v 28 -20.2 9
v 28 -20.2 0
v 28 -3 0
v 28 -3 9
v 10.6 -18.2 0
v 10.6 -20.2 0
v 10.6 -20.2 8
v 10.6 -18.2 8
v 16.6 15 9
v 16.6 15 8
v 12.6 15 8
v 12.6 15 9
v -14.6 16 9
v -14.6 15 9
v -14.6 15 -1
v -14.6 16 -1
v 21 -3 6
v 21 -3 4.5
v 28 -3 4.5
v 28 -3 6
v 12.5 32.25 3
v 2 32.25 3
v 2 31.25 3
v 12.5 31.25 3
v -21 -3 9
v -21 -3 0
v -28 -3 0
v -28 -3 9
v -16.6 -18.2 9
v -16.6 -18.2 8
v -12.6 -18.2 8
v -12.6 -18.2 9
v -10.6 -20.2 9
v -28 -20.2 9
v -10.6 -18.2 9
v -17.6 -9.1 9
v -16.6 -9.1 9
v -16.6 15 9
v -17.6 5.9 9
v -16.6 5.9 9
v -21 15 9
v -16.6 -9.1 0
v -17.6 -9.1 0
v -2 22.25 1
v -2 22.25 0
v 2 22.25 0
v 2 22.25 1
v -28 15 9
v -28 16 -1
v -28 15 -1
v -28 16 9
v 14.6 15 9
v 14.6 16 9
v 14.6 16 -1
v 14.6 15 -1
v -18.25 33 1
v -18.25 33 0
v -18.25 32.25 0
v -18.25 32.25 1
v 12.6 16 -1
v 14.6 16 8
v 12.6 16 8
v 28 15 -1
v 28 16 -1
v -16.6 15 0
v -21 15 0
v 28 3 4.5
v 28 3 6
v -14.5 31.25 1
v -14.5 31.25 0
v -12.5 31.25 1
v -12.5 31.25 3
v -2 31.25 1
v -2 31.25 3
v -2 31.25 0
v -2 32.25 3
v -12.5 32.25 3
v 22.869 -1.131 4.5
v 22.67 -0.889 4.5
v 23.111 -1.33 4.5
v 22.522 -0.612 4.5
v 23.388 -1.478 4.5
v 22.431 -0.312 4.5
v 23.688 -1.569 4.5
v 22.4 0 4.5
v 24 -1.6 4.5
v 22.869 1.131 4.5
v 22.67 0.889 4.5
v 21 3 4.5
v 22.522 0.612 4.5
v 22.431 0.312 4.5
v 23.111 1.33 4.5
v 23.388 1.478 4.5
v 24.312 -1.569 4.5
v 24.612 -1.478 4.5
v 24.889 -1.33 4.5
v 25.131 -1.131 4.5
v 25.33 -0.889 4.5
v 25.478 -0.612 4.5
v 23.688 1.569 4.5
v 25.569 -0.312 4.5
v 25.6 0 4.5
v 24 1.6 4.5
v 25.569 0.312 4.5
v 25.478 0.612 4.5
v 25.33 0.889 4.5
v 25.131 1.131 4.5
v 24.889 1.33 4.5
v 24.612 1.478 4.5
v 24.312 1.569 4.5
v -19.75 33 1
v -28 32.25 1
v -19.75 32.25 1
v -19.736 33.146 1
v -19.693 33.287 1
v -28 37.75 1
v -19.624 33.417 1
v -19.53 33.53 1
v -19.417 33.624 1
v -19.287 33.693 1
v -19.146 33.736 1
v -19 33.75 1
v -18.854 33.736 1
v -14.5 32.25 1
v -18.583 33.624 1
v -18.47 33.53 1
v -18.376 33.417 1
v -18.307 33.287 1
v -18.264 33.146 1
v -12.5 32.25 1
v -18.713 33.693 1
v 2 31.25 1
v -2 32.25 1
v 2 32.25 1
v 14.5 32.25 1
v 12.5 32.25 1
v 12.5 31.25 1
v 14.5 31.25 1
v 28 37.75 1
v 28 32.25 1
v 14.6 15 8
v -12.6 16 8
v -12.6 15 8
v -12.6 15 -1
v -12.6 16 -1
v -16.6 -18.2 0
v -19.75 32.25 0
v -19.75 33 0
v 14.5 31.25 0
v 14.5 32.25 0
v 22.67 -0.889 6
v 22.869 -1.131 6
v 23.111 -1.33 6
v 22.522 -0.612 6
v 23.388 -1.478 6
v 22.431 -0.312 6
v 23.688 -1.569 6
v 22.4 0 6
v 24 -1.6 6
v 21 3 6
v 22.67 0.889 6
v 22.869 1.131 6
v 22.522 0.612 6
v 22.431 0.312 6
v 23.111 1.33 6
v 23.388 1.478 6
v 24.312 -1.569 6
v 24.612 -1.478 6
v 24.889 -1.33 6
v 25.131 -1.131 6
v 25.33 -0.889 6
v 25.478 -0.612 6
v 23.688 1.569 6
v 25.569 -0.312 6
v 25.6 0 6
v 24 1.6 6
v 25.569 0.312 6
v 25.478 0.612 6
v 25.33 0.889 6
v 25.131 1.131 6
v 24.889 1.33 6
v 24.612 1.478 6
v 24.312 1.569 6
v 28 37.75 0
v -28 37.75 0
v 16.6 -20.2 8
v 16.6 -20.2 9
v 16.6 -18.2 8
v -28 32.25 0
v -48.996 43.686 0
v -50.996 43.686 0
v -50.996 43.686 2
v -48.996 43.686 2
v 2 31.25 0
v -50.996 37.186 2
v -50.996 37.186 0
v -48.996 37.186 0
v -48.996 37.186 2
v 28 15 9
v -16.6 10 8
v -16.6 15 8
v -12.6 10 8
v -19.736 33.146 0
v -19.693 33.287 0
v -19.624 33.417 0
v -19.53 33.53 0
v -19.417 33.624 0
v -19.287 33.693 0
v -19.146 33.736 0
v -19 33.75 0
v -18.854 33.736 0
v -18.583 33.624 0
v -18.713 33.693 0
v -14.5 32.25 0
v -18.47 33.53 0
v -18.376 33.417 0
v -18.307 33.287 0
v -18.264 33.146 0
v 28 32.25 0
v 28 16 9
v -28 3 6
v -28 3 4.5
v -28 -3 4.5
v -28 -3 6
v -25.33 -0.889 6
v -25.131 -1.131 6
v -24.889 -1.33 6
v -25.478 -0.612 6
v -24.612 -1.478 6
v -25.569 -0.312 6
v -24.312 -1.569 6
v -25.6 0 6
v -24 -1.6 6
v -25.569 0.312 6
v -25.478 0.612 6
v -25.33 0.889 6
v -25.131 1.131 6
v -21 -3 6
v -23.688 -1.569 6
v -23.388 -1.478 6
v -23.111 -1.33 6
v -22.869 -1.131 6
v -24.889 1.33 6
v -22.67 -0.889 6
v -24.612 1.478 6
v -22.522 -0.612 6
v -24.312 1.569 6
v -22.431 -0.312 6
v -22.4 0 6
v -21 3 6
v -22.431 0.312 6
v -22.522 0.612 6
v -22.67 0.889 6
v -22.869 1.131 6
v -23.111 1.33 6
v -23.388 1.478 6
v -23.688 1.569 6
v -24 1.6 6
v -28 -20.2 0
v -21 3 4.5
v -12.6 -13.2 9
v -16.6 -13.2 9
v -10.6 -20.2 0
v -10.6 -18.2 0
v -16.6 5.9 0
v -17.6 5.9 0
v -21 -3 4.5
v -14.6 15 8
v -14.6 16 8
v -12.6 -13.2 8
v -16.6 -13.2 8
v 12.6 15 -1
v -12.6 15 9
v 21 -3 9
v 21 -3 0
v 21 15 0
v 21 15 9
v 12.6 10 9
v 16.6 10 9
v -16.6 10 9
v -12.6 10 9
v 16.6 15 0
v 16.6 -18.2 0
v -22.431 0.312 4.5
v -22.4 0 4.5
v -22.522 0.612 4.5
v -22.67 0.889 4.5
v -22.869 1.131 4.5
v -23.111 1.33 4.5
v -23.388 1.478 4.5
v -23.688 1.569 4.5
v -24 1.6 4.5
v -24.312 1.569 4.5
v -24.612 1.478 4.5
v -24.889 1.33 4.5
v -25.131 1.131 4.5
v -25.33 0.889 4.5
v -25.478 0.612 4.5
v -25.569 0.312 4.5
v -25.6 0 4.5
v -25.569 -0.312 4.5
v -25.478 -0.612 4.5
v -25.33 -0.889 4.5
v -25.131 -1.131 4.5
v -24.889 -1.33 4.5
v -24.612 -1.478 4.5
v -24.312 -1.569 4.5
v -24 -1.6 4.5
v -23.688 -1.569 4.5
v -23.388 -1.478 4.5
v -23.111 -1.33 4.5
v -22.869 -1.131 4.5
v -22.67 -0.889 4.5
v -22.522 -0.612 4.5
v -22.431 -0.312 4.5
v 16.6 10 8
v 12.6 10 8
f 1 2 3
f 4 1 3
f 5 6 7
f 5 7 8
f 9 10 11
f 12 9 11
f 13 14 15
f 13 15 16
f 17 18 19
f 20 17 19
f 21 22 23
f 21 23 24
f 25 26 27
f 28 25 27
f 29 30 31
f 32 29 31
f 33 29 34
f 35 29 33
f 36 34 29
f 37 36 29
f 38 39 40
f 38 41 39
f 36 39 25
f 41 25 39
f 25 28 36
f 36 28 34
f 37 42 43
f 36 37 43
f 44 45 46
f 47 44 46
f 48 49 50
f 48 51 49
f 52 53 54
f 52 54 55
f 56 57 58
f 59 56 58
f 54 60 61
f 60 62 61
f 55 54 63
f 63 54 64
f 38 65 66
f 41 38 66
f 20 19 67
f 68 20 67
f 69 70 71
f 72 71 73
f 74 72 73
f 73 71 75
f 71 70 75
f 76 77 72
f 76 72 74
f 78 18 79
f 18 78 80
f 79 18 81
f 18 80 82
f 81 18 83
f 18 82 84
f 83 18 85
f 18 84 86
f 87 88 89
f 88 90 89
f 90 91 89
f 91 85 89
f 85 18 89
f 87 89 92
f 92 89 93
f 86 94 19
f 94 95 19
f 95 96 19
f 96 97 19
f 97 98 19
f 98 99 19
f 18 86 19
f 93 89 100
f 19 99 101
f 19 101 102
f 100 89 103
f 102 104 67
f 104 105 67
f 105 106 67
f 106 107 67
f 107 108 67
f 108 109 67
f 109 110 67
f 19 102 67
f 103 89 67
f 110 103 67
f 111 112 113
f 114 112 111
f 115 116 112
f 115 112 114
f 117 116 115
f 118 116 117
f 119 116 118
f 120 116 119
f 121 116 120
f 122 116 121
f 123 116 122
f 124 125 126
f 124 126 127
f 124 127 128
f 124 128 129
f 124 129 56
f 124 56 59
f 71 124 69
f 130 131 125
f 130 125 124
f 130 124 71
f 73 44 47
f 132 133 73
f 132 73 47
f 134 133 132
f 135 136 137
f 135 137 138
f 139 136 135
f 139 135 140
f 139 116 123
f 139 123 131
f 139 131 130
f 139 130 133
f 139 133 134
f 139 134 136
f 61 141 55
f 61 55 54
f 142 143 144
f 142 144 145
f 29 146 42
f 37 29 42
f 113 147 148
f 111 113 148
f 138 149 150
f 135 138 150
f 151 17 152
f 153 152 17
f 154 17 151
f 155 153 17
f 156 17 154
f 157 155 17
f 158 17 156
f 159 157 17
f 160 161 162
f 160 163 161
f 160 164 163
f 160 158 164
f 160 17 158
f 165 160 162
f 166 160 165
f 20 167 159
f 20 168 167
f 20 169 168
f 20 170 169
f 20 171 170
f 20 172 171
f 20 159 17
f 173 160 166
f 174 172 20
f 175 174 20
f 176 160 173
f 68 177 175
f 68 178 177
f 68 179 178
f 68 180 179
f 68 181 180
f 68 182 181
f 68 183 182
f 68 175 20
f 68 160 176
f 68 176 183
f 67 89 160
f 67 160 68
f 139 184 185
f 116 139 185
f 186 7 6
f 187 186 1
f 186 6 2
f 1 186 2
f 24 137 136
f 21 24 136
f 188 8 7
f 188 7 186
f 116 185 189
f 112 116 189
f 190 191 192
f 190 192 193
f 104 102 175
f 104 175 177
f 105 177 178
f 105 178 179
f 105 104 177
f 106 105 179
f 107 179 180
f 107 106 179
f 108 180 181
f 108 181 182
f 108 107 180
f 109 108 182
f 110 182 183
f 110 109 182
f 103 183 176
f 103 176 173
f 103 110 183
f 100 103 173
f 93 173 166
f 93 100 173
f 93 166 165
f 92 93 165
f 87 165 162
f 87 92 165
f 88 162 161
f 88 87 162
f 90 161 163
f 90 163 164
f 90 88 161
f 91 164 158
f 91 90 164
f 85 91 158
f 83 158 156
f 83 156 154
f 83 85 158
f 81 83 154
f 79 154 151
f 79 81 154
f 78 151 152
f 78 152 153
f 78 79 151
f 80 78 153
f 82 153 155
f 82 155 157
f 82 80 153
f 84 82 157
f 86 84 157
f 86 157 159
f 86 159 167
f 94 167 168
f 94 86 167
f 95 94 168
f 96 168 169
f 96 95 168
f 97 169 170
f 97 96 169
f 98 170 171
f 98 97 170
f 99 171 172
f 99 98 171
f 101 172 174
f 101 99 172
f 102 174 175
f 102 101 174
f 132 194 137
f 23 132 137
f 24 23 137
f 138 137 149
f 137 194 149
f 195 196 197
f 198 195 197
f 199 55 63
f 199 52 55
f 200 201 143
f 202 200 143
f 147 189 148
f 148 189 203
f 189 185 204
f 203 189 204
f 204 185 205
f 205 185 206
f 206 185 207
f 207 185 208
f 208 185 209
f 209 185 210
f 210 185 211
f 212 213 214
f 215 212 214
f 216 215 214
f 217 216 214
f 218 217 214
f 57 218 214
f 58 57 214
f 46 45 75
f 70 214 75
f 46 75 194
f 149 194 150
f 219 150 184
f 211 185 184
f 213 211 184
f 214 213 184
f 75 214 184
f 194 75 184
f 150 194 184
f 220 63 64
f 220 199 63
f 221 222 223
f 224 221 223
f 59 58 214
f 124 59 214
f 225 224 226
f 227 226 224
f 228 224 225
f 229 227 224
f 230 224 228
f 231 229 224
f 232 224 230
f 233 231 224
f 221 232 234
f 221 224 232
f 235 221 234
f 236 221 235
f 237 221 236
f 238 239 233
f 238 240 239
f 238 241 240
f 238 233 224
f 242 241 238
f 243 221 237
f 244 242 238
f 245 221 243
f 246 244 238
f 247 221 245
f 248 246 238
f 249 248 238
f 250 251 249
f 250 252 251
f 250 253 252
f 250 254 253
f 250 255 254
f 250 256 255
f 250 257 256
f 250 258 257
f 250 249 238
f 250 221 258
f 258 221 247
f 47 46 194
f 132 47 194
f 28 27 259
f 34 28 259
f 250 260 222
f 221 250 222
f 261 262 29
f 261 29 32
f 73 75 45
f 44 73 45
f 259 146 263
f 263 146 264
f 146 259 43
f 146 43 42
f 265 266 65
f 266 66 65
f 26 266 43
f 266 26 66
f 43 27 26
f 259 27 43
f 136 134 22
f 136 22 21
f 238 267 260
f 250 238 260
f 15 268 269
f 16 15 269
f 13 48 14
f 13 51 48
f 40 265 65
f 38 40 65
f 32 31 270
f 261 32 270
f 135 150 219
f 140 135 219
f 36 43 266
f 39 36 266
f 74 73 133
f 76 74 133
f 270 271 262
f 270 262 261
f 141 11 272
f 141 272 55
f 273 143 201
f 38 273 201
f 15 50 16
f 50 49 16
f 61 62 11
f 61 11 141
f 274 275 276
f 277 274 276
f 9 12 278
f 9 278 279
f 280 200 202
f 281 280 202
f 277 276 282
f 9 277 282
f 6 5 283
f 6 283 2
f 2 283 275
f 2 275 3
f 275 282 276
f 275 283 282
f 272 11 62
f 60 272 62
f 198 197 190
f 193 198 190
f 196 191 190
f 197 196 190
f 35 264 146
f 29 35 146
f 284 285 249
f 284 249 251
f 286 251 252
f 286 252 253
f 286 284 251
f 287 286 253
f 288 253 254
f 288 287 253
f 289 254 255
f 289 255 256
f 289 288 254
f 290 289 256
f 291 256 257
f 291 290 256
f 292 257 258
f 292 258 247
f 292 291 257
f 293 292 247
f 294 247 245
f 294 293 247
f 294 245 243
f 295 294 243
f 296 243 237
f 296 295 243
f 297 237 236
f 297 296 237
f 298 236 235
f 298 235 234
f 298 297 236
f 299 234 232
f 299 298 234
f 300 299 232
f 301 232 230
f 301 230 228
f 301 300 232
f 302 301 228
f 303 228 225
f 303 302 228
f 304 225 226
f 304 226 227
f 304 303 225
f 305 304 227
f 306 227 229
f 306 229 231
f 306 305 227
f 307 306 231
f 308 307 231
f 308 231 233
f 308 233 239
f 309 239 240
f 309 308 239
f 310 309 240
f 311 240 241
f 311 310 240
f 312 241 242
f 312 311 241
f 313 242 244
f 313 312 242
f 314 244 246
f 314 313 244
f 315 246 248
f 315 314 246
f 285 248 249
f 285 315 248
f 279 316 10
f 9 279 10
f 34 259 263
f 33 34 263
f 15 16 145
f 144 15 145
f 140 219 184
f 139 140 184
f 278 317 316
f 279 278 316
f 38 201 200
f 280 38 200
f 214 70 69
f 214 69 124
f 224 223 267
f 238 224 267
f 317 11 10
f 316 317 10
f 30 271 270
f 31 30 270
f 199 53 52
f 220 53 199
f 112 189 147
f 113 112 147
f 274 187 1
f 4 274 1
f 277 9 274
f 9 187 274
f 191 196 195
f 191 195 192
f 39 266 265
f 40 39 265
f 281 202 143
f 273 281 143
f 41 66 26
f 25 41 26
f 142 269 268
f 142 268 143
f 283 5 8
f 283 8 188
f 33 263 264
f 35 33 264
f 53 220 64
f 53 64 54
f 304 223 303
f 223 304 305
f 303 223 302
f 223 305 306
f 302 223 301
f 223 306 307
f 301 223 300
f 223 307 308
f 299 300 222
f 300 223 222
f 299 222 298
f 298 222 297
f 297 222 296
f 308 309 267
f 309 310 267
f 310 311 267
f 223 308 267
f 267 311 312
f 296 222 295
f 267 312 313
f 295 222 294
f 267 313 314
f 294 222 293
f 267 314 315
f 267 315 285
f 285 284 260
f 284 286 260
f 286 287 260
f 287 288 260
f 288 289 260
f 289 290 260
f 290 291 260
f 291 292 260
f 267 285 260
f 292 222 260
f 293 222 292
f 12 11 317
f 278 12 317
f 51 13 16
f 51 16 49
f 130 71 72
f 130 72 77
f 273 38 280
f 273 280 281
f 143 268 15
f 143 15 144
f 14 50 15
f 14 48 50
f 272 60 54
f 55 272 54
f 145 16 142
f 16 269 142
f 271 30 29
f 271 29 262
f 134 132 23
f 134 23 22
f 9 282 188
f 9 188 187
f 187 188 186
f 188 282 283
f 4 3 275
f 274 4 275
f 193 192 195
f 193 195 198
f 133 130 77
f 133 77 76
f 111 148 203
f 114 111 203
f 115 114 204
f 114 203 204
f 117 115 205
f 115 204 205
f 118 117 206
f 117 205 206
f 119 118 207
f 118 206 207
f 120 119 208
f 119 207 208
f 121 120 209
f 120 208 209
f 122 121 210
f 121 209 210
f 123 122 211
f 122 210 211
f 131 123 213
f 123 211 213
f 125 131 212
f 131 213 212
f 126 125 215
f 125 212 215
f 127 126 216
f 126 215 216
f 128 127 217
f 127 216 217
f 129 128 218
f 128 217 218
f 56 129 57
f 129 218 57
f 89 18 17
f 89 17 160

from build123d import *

# Parameters (mm, degrees)
F1_DEPTH      = 9
F0_W          = 4.4
F0_H          = 2
F2_START      = 8
F2_DEPTH      = 1
F0_W_2        = 4
F0_H_2        = 5
F3_START      = 4.5
F0_R          = 1.6
F3_DEPTH      = 1.5
F0_W_3        = 7
F0_H_3        = 6
F4_DEPTH      = 9
F4_DEPTH_BACK = 1
F0_W_4        = 2
F0_H_4        = 1
F5_DEPTH      = 8
F5_DEPTH_BACK = 1
F6_W          = 2
F6_H          = 1
F7_DEPTH      = 1
F6_W_2        = 10.5
F8_DEPTH      = 3
F9_W          = 2
F9_H          = 6.5
F10_DEPTH     = 2
F0_W_5        = 6
F11_DEPTH     = 8


with BuildPart() as f1:
    # F0 (on Top) → F1 (new body)
    with BuildSketch(Plane.XY):
        Polygon((-21, 3), (-21, 0), (-21, -3), (-21, -18.2), (-16.6, -18.2), (-16.6, -13.2), (-16.6, -9.1), (-17.6, -9.1), (-17.6, 5.9), (-16.6, 5.9), (-16.6, 10), (-16.6, 15), (-21, 15), align=None)
        Polygon((-16.6, -18.2), (-21, -18.2), (-21, -20.2), (-10.6, -20.2), (-10.6, -18.2), (-12.6, -18.2), align=None)
        Polygon((-21, -3), (-24, -3), (-28, -3), (-28, -20.2), (-21, -20.2), (-21, -18.2), align=None)
    extrude(amount=F1_DEPTH)


with BuildPart() as f1b:
    # F0 (on Top) → F1, piece 2 (new body)
    with BuildSketch(Plane.XY):
        Polygon((21, -3), (21, 3), (21, 15), (16.6, 15), (16.6, 10), (16.6, -13.2), (16.6, -18.2), (21, -18.2), align=None)
        Polygon((28, -20.2), (28, -3), (21, -3), (21, -18.2), (21, -20.2), align=None)
        with Locations((18.8, -19.2)):
            Rectangle(F0_W, F0_H)
    extrude(amount=F1_DEPTH)

    # F0 (on Top) → F11 (join)
    with BuildSketch(Plane.XY):
        with Locations((13.6, -19.2)):
            Rectangle(F0_W_5, F0_H)
    extrude(amount=F11_DEPTH)


with BuildPart() as f2:
    # F0 (on Top) → F2 (new body)
    with BuildSketch(Plane.XY.offset(F2_START)):
        Polygon((-14.6, 15), (-16.6, 15), (-16.6, 10), (-12.6, 10), (-12.6, 15), align=None)
    extrude(amount=F2_DEPTH)


with BuildPart() as f2b:
    # F0 (on Top) → F2, piece 2 (new body)
    with BuildSketch(Plane.XY.offset(F2_START)):
        with Locations((-14.6, -15.7)):
            Rectangle(F0_W_2, F0_H_2)
    extrude(amount=F2_DEPTH)


with BuildPart() as f2c:
    # F0 (on Top) → F2, piece 3 (new body)
    with BuildSketch(Plane.XY.offset(F2_START)):
        Polygon((16.6, 10), (16.6, 15), (14.6, 15), (12.6, 15), (12.6, 10), align=None)
    extrude(amount=F2_DEPTH)


with BuildPart() as f3:
    # F0 (on Top) → F3 (new body)
    with BuildSketch(Plane.XY.offset(F3_START)):
        with BuildLine():
            ThreePointArc((-24, -3), (-27, 0), (-24, 3))
            Line((-24, 3), (-28, 3))
            Line((-28, 3), (-28, -3))
            Line((-28, -3), (-24, -3))
        make_face()
        with BuildLine():
            ThreePointArc((-24, -3), (-21.8786796564, -2.1213203436), (-21, 0))
            ThreePointArc((-21, 0), (-21.8786796564, 2.1213203436), (-24, 3))
            ThreePointArc((-24, 3), (-27, 0), (-24, -3))
        make_face()
        with Locations((-24, 0)):
            Circle(F0_R, mode=Mode.SUBTRACT)
        with BuildLine():
            ThreePointArc((-24, 3), (-21.8786796564, 2.1213203436), (-21, 0))
            Line((-21, 0), (-21, 3))
            Line((-21, 3), (-24, 3))
        make_face()
        with BuildLine():
            Line((-21, -3), (-21, 0))
            ThreePointArc((-21, 0), (-21.8786796564, -2.1213203436), (-24, -3))
            Line((-24, -3), (-21, -3))
        make_face()
    extrude(amount=F3_DEPTH)


with BuildPart() as f3b:
    # F0 (on Top) → F3, piece 2 (new body)
    with BuildSketch(Plane.XY.offset(F3_START)):
        with Locations((24.5, 0)):
            Rectangle(F0_W_3, F0_H_3)
        with Locations((24, 0)):
            Circle(F0_R, mode=Mode.SUBTRACT)
    extrude(amount=F3_DEPTH)


with BuildPart() as f4:
    # F0 (on Top) → F4 (new body, two sides)
    with BuildSketch(Plane.XY) as f4_sk:
        Polygon((-28, 15), (-21, 15), (-16.6, 15), (-14.6, 15), (-14.6, 16), (-28, 16), align=None)
    extrude(amount=F4_DEPTH)
    extrude(f4_sk.sketch, amount=-F4_DEPTH_BACK)


with BuildPart() as f4b:
    # F0 (on Top) → F4, piece 2 (new body, two sides)
    with BuildSketch(Plane.XY) as f4_2_sk:
        Polygon((16.6, 15), (21, 15), (28, 15), (28, 16), (14.6, 16), (14.6, 15), align=None)
    extrude(amount=F4_DEPTH)
    extrude(f4_2_sk.sketch, amount=-F4_DEPTH_BACK)


with BuildPart() as f5:
    # F0 (on Top) → F5 (new body, two sides)
    with BuildSketch(Plane.XY) as f5_sk:
        with Locations((-13.6, 15.5)):
            Rectangle(F0_W_4, F0_H_4)
    extrude(amount=F5_DEPTH)
    extrude(f5_sk.sketch, amount=-F5_DEPTH_BACK)


with BuildPart() as f5b:
    # F0 (on Top) → F5, piece 2 (new body, two sides)
    with BuildSketch(Plane.XY) as f5_2_sk:
        with Locations((13.6, 15.5)):
            Rectangle(F0_W_4, F0_H_4)
    extrude(amount=F5_DEPTH)
    extrude(f5_2_sk.sketch, amount=-F5_DEPTH_BACK)


with BuildPart() as f7:
    # F6 (on Top) → F7 (new body)
    with BuildSketch(Plane.XY):
        with BuildLine():
            Line((-28, 37.75), (-28, 32.25))
            Line((-28, 32.25), (-19.75, 32.25))
            Line((-19.75, 32.25), (-19.75, 33))
            ThreePointArc((-19.75, 33), (-19, 33.75), (-18.25, 33))
            Line((-18.25, 33), (-18.25, 32.25))
            Line((-18.25, 32.25), (-14.5, 32.25))
            Line((-14.5, 32.25), (-12.5, 32.25))
            Line((-12.5, 32.25), (-2, 32.25))
            Line((-2, 32.25), (2, 32.25))
            Line((2, 32.25), (12.5, 32.25))
            Line((12.5, 32.25), (14.5, 32.25))
            Line((14.5, 32.25), (28, 32.25))
            Line((28, 32.25), (28, 37.75))
            Line((28, 37.75), (-28, 37.75))
        make_face()
        with Locations((-13.5, 31.75)):
            Rectangle(F6_W, F6_H)
        with Locations((13.5, 31.75)):
            Rectangle(F6_W, F6_H)
        Polygon((2, 31.25), (2, 32.25), (-2, 32.25), (-2, 31.25), (-2, 22.25), (2, 22.25), align=None)
    extrude(amount=F7_DEPTH)

    # F6 (on Top) → F8 (join)
    with BuildSketch(Plane.XY):
        with Locations((-7.25, 31.75)):
            Rectangle(F6_W_2, F6_H)
        with Locations((7.25, 31.75)):
            Rectangle(F6_W_2, F6_H)
    extrude(amount=F8_DEPTH)


with BuildPart() as f10:
    # F9 (on Top) → F10 (new body)
    with BuildSketch(Plane.XY):
        with Locations((-49.9955862761, 40.4360860044)):
            Rectangle(F9_W, F9_H)
    extrude(amount=F10_DEPTH)


solid = Compound([f1.part, f1b.part, f2.part, f2b.part, f2c.part, f3.part, f3b.part, f4.part, f4b.part, f5.part, f5b.part, f7.part, f10.part])
